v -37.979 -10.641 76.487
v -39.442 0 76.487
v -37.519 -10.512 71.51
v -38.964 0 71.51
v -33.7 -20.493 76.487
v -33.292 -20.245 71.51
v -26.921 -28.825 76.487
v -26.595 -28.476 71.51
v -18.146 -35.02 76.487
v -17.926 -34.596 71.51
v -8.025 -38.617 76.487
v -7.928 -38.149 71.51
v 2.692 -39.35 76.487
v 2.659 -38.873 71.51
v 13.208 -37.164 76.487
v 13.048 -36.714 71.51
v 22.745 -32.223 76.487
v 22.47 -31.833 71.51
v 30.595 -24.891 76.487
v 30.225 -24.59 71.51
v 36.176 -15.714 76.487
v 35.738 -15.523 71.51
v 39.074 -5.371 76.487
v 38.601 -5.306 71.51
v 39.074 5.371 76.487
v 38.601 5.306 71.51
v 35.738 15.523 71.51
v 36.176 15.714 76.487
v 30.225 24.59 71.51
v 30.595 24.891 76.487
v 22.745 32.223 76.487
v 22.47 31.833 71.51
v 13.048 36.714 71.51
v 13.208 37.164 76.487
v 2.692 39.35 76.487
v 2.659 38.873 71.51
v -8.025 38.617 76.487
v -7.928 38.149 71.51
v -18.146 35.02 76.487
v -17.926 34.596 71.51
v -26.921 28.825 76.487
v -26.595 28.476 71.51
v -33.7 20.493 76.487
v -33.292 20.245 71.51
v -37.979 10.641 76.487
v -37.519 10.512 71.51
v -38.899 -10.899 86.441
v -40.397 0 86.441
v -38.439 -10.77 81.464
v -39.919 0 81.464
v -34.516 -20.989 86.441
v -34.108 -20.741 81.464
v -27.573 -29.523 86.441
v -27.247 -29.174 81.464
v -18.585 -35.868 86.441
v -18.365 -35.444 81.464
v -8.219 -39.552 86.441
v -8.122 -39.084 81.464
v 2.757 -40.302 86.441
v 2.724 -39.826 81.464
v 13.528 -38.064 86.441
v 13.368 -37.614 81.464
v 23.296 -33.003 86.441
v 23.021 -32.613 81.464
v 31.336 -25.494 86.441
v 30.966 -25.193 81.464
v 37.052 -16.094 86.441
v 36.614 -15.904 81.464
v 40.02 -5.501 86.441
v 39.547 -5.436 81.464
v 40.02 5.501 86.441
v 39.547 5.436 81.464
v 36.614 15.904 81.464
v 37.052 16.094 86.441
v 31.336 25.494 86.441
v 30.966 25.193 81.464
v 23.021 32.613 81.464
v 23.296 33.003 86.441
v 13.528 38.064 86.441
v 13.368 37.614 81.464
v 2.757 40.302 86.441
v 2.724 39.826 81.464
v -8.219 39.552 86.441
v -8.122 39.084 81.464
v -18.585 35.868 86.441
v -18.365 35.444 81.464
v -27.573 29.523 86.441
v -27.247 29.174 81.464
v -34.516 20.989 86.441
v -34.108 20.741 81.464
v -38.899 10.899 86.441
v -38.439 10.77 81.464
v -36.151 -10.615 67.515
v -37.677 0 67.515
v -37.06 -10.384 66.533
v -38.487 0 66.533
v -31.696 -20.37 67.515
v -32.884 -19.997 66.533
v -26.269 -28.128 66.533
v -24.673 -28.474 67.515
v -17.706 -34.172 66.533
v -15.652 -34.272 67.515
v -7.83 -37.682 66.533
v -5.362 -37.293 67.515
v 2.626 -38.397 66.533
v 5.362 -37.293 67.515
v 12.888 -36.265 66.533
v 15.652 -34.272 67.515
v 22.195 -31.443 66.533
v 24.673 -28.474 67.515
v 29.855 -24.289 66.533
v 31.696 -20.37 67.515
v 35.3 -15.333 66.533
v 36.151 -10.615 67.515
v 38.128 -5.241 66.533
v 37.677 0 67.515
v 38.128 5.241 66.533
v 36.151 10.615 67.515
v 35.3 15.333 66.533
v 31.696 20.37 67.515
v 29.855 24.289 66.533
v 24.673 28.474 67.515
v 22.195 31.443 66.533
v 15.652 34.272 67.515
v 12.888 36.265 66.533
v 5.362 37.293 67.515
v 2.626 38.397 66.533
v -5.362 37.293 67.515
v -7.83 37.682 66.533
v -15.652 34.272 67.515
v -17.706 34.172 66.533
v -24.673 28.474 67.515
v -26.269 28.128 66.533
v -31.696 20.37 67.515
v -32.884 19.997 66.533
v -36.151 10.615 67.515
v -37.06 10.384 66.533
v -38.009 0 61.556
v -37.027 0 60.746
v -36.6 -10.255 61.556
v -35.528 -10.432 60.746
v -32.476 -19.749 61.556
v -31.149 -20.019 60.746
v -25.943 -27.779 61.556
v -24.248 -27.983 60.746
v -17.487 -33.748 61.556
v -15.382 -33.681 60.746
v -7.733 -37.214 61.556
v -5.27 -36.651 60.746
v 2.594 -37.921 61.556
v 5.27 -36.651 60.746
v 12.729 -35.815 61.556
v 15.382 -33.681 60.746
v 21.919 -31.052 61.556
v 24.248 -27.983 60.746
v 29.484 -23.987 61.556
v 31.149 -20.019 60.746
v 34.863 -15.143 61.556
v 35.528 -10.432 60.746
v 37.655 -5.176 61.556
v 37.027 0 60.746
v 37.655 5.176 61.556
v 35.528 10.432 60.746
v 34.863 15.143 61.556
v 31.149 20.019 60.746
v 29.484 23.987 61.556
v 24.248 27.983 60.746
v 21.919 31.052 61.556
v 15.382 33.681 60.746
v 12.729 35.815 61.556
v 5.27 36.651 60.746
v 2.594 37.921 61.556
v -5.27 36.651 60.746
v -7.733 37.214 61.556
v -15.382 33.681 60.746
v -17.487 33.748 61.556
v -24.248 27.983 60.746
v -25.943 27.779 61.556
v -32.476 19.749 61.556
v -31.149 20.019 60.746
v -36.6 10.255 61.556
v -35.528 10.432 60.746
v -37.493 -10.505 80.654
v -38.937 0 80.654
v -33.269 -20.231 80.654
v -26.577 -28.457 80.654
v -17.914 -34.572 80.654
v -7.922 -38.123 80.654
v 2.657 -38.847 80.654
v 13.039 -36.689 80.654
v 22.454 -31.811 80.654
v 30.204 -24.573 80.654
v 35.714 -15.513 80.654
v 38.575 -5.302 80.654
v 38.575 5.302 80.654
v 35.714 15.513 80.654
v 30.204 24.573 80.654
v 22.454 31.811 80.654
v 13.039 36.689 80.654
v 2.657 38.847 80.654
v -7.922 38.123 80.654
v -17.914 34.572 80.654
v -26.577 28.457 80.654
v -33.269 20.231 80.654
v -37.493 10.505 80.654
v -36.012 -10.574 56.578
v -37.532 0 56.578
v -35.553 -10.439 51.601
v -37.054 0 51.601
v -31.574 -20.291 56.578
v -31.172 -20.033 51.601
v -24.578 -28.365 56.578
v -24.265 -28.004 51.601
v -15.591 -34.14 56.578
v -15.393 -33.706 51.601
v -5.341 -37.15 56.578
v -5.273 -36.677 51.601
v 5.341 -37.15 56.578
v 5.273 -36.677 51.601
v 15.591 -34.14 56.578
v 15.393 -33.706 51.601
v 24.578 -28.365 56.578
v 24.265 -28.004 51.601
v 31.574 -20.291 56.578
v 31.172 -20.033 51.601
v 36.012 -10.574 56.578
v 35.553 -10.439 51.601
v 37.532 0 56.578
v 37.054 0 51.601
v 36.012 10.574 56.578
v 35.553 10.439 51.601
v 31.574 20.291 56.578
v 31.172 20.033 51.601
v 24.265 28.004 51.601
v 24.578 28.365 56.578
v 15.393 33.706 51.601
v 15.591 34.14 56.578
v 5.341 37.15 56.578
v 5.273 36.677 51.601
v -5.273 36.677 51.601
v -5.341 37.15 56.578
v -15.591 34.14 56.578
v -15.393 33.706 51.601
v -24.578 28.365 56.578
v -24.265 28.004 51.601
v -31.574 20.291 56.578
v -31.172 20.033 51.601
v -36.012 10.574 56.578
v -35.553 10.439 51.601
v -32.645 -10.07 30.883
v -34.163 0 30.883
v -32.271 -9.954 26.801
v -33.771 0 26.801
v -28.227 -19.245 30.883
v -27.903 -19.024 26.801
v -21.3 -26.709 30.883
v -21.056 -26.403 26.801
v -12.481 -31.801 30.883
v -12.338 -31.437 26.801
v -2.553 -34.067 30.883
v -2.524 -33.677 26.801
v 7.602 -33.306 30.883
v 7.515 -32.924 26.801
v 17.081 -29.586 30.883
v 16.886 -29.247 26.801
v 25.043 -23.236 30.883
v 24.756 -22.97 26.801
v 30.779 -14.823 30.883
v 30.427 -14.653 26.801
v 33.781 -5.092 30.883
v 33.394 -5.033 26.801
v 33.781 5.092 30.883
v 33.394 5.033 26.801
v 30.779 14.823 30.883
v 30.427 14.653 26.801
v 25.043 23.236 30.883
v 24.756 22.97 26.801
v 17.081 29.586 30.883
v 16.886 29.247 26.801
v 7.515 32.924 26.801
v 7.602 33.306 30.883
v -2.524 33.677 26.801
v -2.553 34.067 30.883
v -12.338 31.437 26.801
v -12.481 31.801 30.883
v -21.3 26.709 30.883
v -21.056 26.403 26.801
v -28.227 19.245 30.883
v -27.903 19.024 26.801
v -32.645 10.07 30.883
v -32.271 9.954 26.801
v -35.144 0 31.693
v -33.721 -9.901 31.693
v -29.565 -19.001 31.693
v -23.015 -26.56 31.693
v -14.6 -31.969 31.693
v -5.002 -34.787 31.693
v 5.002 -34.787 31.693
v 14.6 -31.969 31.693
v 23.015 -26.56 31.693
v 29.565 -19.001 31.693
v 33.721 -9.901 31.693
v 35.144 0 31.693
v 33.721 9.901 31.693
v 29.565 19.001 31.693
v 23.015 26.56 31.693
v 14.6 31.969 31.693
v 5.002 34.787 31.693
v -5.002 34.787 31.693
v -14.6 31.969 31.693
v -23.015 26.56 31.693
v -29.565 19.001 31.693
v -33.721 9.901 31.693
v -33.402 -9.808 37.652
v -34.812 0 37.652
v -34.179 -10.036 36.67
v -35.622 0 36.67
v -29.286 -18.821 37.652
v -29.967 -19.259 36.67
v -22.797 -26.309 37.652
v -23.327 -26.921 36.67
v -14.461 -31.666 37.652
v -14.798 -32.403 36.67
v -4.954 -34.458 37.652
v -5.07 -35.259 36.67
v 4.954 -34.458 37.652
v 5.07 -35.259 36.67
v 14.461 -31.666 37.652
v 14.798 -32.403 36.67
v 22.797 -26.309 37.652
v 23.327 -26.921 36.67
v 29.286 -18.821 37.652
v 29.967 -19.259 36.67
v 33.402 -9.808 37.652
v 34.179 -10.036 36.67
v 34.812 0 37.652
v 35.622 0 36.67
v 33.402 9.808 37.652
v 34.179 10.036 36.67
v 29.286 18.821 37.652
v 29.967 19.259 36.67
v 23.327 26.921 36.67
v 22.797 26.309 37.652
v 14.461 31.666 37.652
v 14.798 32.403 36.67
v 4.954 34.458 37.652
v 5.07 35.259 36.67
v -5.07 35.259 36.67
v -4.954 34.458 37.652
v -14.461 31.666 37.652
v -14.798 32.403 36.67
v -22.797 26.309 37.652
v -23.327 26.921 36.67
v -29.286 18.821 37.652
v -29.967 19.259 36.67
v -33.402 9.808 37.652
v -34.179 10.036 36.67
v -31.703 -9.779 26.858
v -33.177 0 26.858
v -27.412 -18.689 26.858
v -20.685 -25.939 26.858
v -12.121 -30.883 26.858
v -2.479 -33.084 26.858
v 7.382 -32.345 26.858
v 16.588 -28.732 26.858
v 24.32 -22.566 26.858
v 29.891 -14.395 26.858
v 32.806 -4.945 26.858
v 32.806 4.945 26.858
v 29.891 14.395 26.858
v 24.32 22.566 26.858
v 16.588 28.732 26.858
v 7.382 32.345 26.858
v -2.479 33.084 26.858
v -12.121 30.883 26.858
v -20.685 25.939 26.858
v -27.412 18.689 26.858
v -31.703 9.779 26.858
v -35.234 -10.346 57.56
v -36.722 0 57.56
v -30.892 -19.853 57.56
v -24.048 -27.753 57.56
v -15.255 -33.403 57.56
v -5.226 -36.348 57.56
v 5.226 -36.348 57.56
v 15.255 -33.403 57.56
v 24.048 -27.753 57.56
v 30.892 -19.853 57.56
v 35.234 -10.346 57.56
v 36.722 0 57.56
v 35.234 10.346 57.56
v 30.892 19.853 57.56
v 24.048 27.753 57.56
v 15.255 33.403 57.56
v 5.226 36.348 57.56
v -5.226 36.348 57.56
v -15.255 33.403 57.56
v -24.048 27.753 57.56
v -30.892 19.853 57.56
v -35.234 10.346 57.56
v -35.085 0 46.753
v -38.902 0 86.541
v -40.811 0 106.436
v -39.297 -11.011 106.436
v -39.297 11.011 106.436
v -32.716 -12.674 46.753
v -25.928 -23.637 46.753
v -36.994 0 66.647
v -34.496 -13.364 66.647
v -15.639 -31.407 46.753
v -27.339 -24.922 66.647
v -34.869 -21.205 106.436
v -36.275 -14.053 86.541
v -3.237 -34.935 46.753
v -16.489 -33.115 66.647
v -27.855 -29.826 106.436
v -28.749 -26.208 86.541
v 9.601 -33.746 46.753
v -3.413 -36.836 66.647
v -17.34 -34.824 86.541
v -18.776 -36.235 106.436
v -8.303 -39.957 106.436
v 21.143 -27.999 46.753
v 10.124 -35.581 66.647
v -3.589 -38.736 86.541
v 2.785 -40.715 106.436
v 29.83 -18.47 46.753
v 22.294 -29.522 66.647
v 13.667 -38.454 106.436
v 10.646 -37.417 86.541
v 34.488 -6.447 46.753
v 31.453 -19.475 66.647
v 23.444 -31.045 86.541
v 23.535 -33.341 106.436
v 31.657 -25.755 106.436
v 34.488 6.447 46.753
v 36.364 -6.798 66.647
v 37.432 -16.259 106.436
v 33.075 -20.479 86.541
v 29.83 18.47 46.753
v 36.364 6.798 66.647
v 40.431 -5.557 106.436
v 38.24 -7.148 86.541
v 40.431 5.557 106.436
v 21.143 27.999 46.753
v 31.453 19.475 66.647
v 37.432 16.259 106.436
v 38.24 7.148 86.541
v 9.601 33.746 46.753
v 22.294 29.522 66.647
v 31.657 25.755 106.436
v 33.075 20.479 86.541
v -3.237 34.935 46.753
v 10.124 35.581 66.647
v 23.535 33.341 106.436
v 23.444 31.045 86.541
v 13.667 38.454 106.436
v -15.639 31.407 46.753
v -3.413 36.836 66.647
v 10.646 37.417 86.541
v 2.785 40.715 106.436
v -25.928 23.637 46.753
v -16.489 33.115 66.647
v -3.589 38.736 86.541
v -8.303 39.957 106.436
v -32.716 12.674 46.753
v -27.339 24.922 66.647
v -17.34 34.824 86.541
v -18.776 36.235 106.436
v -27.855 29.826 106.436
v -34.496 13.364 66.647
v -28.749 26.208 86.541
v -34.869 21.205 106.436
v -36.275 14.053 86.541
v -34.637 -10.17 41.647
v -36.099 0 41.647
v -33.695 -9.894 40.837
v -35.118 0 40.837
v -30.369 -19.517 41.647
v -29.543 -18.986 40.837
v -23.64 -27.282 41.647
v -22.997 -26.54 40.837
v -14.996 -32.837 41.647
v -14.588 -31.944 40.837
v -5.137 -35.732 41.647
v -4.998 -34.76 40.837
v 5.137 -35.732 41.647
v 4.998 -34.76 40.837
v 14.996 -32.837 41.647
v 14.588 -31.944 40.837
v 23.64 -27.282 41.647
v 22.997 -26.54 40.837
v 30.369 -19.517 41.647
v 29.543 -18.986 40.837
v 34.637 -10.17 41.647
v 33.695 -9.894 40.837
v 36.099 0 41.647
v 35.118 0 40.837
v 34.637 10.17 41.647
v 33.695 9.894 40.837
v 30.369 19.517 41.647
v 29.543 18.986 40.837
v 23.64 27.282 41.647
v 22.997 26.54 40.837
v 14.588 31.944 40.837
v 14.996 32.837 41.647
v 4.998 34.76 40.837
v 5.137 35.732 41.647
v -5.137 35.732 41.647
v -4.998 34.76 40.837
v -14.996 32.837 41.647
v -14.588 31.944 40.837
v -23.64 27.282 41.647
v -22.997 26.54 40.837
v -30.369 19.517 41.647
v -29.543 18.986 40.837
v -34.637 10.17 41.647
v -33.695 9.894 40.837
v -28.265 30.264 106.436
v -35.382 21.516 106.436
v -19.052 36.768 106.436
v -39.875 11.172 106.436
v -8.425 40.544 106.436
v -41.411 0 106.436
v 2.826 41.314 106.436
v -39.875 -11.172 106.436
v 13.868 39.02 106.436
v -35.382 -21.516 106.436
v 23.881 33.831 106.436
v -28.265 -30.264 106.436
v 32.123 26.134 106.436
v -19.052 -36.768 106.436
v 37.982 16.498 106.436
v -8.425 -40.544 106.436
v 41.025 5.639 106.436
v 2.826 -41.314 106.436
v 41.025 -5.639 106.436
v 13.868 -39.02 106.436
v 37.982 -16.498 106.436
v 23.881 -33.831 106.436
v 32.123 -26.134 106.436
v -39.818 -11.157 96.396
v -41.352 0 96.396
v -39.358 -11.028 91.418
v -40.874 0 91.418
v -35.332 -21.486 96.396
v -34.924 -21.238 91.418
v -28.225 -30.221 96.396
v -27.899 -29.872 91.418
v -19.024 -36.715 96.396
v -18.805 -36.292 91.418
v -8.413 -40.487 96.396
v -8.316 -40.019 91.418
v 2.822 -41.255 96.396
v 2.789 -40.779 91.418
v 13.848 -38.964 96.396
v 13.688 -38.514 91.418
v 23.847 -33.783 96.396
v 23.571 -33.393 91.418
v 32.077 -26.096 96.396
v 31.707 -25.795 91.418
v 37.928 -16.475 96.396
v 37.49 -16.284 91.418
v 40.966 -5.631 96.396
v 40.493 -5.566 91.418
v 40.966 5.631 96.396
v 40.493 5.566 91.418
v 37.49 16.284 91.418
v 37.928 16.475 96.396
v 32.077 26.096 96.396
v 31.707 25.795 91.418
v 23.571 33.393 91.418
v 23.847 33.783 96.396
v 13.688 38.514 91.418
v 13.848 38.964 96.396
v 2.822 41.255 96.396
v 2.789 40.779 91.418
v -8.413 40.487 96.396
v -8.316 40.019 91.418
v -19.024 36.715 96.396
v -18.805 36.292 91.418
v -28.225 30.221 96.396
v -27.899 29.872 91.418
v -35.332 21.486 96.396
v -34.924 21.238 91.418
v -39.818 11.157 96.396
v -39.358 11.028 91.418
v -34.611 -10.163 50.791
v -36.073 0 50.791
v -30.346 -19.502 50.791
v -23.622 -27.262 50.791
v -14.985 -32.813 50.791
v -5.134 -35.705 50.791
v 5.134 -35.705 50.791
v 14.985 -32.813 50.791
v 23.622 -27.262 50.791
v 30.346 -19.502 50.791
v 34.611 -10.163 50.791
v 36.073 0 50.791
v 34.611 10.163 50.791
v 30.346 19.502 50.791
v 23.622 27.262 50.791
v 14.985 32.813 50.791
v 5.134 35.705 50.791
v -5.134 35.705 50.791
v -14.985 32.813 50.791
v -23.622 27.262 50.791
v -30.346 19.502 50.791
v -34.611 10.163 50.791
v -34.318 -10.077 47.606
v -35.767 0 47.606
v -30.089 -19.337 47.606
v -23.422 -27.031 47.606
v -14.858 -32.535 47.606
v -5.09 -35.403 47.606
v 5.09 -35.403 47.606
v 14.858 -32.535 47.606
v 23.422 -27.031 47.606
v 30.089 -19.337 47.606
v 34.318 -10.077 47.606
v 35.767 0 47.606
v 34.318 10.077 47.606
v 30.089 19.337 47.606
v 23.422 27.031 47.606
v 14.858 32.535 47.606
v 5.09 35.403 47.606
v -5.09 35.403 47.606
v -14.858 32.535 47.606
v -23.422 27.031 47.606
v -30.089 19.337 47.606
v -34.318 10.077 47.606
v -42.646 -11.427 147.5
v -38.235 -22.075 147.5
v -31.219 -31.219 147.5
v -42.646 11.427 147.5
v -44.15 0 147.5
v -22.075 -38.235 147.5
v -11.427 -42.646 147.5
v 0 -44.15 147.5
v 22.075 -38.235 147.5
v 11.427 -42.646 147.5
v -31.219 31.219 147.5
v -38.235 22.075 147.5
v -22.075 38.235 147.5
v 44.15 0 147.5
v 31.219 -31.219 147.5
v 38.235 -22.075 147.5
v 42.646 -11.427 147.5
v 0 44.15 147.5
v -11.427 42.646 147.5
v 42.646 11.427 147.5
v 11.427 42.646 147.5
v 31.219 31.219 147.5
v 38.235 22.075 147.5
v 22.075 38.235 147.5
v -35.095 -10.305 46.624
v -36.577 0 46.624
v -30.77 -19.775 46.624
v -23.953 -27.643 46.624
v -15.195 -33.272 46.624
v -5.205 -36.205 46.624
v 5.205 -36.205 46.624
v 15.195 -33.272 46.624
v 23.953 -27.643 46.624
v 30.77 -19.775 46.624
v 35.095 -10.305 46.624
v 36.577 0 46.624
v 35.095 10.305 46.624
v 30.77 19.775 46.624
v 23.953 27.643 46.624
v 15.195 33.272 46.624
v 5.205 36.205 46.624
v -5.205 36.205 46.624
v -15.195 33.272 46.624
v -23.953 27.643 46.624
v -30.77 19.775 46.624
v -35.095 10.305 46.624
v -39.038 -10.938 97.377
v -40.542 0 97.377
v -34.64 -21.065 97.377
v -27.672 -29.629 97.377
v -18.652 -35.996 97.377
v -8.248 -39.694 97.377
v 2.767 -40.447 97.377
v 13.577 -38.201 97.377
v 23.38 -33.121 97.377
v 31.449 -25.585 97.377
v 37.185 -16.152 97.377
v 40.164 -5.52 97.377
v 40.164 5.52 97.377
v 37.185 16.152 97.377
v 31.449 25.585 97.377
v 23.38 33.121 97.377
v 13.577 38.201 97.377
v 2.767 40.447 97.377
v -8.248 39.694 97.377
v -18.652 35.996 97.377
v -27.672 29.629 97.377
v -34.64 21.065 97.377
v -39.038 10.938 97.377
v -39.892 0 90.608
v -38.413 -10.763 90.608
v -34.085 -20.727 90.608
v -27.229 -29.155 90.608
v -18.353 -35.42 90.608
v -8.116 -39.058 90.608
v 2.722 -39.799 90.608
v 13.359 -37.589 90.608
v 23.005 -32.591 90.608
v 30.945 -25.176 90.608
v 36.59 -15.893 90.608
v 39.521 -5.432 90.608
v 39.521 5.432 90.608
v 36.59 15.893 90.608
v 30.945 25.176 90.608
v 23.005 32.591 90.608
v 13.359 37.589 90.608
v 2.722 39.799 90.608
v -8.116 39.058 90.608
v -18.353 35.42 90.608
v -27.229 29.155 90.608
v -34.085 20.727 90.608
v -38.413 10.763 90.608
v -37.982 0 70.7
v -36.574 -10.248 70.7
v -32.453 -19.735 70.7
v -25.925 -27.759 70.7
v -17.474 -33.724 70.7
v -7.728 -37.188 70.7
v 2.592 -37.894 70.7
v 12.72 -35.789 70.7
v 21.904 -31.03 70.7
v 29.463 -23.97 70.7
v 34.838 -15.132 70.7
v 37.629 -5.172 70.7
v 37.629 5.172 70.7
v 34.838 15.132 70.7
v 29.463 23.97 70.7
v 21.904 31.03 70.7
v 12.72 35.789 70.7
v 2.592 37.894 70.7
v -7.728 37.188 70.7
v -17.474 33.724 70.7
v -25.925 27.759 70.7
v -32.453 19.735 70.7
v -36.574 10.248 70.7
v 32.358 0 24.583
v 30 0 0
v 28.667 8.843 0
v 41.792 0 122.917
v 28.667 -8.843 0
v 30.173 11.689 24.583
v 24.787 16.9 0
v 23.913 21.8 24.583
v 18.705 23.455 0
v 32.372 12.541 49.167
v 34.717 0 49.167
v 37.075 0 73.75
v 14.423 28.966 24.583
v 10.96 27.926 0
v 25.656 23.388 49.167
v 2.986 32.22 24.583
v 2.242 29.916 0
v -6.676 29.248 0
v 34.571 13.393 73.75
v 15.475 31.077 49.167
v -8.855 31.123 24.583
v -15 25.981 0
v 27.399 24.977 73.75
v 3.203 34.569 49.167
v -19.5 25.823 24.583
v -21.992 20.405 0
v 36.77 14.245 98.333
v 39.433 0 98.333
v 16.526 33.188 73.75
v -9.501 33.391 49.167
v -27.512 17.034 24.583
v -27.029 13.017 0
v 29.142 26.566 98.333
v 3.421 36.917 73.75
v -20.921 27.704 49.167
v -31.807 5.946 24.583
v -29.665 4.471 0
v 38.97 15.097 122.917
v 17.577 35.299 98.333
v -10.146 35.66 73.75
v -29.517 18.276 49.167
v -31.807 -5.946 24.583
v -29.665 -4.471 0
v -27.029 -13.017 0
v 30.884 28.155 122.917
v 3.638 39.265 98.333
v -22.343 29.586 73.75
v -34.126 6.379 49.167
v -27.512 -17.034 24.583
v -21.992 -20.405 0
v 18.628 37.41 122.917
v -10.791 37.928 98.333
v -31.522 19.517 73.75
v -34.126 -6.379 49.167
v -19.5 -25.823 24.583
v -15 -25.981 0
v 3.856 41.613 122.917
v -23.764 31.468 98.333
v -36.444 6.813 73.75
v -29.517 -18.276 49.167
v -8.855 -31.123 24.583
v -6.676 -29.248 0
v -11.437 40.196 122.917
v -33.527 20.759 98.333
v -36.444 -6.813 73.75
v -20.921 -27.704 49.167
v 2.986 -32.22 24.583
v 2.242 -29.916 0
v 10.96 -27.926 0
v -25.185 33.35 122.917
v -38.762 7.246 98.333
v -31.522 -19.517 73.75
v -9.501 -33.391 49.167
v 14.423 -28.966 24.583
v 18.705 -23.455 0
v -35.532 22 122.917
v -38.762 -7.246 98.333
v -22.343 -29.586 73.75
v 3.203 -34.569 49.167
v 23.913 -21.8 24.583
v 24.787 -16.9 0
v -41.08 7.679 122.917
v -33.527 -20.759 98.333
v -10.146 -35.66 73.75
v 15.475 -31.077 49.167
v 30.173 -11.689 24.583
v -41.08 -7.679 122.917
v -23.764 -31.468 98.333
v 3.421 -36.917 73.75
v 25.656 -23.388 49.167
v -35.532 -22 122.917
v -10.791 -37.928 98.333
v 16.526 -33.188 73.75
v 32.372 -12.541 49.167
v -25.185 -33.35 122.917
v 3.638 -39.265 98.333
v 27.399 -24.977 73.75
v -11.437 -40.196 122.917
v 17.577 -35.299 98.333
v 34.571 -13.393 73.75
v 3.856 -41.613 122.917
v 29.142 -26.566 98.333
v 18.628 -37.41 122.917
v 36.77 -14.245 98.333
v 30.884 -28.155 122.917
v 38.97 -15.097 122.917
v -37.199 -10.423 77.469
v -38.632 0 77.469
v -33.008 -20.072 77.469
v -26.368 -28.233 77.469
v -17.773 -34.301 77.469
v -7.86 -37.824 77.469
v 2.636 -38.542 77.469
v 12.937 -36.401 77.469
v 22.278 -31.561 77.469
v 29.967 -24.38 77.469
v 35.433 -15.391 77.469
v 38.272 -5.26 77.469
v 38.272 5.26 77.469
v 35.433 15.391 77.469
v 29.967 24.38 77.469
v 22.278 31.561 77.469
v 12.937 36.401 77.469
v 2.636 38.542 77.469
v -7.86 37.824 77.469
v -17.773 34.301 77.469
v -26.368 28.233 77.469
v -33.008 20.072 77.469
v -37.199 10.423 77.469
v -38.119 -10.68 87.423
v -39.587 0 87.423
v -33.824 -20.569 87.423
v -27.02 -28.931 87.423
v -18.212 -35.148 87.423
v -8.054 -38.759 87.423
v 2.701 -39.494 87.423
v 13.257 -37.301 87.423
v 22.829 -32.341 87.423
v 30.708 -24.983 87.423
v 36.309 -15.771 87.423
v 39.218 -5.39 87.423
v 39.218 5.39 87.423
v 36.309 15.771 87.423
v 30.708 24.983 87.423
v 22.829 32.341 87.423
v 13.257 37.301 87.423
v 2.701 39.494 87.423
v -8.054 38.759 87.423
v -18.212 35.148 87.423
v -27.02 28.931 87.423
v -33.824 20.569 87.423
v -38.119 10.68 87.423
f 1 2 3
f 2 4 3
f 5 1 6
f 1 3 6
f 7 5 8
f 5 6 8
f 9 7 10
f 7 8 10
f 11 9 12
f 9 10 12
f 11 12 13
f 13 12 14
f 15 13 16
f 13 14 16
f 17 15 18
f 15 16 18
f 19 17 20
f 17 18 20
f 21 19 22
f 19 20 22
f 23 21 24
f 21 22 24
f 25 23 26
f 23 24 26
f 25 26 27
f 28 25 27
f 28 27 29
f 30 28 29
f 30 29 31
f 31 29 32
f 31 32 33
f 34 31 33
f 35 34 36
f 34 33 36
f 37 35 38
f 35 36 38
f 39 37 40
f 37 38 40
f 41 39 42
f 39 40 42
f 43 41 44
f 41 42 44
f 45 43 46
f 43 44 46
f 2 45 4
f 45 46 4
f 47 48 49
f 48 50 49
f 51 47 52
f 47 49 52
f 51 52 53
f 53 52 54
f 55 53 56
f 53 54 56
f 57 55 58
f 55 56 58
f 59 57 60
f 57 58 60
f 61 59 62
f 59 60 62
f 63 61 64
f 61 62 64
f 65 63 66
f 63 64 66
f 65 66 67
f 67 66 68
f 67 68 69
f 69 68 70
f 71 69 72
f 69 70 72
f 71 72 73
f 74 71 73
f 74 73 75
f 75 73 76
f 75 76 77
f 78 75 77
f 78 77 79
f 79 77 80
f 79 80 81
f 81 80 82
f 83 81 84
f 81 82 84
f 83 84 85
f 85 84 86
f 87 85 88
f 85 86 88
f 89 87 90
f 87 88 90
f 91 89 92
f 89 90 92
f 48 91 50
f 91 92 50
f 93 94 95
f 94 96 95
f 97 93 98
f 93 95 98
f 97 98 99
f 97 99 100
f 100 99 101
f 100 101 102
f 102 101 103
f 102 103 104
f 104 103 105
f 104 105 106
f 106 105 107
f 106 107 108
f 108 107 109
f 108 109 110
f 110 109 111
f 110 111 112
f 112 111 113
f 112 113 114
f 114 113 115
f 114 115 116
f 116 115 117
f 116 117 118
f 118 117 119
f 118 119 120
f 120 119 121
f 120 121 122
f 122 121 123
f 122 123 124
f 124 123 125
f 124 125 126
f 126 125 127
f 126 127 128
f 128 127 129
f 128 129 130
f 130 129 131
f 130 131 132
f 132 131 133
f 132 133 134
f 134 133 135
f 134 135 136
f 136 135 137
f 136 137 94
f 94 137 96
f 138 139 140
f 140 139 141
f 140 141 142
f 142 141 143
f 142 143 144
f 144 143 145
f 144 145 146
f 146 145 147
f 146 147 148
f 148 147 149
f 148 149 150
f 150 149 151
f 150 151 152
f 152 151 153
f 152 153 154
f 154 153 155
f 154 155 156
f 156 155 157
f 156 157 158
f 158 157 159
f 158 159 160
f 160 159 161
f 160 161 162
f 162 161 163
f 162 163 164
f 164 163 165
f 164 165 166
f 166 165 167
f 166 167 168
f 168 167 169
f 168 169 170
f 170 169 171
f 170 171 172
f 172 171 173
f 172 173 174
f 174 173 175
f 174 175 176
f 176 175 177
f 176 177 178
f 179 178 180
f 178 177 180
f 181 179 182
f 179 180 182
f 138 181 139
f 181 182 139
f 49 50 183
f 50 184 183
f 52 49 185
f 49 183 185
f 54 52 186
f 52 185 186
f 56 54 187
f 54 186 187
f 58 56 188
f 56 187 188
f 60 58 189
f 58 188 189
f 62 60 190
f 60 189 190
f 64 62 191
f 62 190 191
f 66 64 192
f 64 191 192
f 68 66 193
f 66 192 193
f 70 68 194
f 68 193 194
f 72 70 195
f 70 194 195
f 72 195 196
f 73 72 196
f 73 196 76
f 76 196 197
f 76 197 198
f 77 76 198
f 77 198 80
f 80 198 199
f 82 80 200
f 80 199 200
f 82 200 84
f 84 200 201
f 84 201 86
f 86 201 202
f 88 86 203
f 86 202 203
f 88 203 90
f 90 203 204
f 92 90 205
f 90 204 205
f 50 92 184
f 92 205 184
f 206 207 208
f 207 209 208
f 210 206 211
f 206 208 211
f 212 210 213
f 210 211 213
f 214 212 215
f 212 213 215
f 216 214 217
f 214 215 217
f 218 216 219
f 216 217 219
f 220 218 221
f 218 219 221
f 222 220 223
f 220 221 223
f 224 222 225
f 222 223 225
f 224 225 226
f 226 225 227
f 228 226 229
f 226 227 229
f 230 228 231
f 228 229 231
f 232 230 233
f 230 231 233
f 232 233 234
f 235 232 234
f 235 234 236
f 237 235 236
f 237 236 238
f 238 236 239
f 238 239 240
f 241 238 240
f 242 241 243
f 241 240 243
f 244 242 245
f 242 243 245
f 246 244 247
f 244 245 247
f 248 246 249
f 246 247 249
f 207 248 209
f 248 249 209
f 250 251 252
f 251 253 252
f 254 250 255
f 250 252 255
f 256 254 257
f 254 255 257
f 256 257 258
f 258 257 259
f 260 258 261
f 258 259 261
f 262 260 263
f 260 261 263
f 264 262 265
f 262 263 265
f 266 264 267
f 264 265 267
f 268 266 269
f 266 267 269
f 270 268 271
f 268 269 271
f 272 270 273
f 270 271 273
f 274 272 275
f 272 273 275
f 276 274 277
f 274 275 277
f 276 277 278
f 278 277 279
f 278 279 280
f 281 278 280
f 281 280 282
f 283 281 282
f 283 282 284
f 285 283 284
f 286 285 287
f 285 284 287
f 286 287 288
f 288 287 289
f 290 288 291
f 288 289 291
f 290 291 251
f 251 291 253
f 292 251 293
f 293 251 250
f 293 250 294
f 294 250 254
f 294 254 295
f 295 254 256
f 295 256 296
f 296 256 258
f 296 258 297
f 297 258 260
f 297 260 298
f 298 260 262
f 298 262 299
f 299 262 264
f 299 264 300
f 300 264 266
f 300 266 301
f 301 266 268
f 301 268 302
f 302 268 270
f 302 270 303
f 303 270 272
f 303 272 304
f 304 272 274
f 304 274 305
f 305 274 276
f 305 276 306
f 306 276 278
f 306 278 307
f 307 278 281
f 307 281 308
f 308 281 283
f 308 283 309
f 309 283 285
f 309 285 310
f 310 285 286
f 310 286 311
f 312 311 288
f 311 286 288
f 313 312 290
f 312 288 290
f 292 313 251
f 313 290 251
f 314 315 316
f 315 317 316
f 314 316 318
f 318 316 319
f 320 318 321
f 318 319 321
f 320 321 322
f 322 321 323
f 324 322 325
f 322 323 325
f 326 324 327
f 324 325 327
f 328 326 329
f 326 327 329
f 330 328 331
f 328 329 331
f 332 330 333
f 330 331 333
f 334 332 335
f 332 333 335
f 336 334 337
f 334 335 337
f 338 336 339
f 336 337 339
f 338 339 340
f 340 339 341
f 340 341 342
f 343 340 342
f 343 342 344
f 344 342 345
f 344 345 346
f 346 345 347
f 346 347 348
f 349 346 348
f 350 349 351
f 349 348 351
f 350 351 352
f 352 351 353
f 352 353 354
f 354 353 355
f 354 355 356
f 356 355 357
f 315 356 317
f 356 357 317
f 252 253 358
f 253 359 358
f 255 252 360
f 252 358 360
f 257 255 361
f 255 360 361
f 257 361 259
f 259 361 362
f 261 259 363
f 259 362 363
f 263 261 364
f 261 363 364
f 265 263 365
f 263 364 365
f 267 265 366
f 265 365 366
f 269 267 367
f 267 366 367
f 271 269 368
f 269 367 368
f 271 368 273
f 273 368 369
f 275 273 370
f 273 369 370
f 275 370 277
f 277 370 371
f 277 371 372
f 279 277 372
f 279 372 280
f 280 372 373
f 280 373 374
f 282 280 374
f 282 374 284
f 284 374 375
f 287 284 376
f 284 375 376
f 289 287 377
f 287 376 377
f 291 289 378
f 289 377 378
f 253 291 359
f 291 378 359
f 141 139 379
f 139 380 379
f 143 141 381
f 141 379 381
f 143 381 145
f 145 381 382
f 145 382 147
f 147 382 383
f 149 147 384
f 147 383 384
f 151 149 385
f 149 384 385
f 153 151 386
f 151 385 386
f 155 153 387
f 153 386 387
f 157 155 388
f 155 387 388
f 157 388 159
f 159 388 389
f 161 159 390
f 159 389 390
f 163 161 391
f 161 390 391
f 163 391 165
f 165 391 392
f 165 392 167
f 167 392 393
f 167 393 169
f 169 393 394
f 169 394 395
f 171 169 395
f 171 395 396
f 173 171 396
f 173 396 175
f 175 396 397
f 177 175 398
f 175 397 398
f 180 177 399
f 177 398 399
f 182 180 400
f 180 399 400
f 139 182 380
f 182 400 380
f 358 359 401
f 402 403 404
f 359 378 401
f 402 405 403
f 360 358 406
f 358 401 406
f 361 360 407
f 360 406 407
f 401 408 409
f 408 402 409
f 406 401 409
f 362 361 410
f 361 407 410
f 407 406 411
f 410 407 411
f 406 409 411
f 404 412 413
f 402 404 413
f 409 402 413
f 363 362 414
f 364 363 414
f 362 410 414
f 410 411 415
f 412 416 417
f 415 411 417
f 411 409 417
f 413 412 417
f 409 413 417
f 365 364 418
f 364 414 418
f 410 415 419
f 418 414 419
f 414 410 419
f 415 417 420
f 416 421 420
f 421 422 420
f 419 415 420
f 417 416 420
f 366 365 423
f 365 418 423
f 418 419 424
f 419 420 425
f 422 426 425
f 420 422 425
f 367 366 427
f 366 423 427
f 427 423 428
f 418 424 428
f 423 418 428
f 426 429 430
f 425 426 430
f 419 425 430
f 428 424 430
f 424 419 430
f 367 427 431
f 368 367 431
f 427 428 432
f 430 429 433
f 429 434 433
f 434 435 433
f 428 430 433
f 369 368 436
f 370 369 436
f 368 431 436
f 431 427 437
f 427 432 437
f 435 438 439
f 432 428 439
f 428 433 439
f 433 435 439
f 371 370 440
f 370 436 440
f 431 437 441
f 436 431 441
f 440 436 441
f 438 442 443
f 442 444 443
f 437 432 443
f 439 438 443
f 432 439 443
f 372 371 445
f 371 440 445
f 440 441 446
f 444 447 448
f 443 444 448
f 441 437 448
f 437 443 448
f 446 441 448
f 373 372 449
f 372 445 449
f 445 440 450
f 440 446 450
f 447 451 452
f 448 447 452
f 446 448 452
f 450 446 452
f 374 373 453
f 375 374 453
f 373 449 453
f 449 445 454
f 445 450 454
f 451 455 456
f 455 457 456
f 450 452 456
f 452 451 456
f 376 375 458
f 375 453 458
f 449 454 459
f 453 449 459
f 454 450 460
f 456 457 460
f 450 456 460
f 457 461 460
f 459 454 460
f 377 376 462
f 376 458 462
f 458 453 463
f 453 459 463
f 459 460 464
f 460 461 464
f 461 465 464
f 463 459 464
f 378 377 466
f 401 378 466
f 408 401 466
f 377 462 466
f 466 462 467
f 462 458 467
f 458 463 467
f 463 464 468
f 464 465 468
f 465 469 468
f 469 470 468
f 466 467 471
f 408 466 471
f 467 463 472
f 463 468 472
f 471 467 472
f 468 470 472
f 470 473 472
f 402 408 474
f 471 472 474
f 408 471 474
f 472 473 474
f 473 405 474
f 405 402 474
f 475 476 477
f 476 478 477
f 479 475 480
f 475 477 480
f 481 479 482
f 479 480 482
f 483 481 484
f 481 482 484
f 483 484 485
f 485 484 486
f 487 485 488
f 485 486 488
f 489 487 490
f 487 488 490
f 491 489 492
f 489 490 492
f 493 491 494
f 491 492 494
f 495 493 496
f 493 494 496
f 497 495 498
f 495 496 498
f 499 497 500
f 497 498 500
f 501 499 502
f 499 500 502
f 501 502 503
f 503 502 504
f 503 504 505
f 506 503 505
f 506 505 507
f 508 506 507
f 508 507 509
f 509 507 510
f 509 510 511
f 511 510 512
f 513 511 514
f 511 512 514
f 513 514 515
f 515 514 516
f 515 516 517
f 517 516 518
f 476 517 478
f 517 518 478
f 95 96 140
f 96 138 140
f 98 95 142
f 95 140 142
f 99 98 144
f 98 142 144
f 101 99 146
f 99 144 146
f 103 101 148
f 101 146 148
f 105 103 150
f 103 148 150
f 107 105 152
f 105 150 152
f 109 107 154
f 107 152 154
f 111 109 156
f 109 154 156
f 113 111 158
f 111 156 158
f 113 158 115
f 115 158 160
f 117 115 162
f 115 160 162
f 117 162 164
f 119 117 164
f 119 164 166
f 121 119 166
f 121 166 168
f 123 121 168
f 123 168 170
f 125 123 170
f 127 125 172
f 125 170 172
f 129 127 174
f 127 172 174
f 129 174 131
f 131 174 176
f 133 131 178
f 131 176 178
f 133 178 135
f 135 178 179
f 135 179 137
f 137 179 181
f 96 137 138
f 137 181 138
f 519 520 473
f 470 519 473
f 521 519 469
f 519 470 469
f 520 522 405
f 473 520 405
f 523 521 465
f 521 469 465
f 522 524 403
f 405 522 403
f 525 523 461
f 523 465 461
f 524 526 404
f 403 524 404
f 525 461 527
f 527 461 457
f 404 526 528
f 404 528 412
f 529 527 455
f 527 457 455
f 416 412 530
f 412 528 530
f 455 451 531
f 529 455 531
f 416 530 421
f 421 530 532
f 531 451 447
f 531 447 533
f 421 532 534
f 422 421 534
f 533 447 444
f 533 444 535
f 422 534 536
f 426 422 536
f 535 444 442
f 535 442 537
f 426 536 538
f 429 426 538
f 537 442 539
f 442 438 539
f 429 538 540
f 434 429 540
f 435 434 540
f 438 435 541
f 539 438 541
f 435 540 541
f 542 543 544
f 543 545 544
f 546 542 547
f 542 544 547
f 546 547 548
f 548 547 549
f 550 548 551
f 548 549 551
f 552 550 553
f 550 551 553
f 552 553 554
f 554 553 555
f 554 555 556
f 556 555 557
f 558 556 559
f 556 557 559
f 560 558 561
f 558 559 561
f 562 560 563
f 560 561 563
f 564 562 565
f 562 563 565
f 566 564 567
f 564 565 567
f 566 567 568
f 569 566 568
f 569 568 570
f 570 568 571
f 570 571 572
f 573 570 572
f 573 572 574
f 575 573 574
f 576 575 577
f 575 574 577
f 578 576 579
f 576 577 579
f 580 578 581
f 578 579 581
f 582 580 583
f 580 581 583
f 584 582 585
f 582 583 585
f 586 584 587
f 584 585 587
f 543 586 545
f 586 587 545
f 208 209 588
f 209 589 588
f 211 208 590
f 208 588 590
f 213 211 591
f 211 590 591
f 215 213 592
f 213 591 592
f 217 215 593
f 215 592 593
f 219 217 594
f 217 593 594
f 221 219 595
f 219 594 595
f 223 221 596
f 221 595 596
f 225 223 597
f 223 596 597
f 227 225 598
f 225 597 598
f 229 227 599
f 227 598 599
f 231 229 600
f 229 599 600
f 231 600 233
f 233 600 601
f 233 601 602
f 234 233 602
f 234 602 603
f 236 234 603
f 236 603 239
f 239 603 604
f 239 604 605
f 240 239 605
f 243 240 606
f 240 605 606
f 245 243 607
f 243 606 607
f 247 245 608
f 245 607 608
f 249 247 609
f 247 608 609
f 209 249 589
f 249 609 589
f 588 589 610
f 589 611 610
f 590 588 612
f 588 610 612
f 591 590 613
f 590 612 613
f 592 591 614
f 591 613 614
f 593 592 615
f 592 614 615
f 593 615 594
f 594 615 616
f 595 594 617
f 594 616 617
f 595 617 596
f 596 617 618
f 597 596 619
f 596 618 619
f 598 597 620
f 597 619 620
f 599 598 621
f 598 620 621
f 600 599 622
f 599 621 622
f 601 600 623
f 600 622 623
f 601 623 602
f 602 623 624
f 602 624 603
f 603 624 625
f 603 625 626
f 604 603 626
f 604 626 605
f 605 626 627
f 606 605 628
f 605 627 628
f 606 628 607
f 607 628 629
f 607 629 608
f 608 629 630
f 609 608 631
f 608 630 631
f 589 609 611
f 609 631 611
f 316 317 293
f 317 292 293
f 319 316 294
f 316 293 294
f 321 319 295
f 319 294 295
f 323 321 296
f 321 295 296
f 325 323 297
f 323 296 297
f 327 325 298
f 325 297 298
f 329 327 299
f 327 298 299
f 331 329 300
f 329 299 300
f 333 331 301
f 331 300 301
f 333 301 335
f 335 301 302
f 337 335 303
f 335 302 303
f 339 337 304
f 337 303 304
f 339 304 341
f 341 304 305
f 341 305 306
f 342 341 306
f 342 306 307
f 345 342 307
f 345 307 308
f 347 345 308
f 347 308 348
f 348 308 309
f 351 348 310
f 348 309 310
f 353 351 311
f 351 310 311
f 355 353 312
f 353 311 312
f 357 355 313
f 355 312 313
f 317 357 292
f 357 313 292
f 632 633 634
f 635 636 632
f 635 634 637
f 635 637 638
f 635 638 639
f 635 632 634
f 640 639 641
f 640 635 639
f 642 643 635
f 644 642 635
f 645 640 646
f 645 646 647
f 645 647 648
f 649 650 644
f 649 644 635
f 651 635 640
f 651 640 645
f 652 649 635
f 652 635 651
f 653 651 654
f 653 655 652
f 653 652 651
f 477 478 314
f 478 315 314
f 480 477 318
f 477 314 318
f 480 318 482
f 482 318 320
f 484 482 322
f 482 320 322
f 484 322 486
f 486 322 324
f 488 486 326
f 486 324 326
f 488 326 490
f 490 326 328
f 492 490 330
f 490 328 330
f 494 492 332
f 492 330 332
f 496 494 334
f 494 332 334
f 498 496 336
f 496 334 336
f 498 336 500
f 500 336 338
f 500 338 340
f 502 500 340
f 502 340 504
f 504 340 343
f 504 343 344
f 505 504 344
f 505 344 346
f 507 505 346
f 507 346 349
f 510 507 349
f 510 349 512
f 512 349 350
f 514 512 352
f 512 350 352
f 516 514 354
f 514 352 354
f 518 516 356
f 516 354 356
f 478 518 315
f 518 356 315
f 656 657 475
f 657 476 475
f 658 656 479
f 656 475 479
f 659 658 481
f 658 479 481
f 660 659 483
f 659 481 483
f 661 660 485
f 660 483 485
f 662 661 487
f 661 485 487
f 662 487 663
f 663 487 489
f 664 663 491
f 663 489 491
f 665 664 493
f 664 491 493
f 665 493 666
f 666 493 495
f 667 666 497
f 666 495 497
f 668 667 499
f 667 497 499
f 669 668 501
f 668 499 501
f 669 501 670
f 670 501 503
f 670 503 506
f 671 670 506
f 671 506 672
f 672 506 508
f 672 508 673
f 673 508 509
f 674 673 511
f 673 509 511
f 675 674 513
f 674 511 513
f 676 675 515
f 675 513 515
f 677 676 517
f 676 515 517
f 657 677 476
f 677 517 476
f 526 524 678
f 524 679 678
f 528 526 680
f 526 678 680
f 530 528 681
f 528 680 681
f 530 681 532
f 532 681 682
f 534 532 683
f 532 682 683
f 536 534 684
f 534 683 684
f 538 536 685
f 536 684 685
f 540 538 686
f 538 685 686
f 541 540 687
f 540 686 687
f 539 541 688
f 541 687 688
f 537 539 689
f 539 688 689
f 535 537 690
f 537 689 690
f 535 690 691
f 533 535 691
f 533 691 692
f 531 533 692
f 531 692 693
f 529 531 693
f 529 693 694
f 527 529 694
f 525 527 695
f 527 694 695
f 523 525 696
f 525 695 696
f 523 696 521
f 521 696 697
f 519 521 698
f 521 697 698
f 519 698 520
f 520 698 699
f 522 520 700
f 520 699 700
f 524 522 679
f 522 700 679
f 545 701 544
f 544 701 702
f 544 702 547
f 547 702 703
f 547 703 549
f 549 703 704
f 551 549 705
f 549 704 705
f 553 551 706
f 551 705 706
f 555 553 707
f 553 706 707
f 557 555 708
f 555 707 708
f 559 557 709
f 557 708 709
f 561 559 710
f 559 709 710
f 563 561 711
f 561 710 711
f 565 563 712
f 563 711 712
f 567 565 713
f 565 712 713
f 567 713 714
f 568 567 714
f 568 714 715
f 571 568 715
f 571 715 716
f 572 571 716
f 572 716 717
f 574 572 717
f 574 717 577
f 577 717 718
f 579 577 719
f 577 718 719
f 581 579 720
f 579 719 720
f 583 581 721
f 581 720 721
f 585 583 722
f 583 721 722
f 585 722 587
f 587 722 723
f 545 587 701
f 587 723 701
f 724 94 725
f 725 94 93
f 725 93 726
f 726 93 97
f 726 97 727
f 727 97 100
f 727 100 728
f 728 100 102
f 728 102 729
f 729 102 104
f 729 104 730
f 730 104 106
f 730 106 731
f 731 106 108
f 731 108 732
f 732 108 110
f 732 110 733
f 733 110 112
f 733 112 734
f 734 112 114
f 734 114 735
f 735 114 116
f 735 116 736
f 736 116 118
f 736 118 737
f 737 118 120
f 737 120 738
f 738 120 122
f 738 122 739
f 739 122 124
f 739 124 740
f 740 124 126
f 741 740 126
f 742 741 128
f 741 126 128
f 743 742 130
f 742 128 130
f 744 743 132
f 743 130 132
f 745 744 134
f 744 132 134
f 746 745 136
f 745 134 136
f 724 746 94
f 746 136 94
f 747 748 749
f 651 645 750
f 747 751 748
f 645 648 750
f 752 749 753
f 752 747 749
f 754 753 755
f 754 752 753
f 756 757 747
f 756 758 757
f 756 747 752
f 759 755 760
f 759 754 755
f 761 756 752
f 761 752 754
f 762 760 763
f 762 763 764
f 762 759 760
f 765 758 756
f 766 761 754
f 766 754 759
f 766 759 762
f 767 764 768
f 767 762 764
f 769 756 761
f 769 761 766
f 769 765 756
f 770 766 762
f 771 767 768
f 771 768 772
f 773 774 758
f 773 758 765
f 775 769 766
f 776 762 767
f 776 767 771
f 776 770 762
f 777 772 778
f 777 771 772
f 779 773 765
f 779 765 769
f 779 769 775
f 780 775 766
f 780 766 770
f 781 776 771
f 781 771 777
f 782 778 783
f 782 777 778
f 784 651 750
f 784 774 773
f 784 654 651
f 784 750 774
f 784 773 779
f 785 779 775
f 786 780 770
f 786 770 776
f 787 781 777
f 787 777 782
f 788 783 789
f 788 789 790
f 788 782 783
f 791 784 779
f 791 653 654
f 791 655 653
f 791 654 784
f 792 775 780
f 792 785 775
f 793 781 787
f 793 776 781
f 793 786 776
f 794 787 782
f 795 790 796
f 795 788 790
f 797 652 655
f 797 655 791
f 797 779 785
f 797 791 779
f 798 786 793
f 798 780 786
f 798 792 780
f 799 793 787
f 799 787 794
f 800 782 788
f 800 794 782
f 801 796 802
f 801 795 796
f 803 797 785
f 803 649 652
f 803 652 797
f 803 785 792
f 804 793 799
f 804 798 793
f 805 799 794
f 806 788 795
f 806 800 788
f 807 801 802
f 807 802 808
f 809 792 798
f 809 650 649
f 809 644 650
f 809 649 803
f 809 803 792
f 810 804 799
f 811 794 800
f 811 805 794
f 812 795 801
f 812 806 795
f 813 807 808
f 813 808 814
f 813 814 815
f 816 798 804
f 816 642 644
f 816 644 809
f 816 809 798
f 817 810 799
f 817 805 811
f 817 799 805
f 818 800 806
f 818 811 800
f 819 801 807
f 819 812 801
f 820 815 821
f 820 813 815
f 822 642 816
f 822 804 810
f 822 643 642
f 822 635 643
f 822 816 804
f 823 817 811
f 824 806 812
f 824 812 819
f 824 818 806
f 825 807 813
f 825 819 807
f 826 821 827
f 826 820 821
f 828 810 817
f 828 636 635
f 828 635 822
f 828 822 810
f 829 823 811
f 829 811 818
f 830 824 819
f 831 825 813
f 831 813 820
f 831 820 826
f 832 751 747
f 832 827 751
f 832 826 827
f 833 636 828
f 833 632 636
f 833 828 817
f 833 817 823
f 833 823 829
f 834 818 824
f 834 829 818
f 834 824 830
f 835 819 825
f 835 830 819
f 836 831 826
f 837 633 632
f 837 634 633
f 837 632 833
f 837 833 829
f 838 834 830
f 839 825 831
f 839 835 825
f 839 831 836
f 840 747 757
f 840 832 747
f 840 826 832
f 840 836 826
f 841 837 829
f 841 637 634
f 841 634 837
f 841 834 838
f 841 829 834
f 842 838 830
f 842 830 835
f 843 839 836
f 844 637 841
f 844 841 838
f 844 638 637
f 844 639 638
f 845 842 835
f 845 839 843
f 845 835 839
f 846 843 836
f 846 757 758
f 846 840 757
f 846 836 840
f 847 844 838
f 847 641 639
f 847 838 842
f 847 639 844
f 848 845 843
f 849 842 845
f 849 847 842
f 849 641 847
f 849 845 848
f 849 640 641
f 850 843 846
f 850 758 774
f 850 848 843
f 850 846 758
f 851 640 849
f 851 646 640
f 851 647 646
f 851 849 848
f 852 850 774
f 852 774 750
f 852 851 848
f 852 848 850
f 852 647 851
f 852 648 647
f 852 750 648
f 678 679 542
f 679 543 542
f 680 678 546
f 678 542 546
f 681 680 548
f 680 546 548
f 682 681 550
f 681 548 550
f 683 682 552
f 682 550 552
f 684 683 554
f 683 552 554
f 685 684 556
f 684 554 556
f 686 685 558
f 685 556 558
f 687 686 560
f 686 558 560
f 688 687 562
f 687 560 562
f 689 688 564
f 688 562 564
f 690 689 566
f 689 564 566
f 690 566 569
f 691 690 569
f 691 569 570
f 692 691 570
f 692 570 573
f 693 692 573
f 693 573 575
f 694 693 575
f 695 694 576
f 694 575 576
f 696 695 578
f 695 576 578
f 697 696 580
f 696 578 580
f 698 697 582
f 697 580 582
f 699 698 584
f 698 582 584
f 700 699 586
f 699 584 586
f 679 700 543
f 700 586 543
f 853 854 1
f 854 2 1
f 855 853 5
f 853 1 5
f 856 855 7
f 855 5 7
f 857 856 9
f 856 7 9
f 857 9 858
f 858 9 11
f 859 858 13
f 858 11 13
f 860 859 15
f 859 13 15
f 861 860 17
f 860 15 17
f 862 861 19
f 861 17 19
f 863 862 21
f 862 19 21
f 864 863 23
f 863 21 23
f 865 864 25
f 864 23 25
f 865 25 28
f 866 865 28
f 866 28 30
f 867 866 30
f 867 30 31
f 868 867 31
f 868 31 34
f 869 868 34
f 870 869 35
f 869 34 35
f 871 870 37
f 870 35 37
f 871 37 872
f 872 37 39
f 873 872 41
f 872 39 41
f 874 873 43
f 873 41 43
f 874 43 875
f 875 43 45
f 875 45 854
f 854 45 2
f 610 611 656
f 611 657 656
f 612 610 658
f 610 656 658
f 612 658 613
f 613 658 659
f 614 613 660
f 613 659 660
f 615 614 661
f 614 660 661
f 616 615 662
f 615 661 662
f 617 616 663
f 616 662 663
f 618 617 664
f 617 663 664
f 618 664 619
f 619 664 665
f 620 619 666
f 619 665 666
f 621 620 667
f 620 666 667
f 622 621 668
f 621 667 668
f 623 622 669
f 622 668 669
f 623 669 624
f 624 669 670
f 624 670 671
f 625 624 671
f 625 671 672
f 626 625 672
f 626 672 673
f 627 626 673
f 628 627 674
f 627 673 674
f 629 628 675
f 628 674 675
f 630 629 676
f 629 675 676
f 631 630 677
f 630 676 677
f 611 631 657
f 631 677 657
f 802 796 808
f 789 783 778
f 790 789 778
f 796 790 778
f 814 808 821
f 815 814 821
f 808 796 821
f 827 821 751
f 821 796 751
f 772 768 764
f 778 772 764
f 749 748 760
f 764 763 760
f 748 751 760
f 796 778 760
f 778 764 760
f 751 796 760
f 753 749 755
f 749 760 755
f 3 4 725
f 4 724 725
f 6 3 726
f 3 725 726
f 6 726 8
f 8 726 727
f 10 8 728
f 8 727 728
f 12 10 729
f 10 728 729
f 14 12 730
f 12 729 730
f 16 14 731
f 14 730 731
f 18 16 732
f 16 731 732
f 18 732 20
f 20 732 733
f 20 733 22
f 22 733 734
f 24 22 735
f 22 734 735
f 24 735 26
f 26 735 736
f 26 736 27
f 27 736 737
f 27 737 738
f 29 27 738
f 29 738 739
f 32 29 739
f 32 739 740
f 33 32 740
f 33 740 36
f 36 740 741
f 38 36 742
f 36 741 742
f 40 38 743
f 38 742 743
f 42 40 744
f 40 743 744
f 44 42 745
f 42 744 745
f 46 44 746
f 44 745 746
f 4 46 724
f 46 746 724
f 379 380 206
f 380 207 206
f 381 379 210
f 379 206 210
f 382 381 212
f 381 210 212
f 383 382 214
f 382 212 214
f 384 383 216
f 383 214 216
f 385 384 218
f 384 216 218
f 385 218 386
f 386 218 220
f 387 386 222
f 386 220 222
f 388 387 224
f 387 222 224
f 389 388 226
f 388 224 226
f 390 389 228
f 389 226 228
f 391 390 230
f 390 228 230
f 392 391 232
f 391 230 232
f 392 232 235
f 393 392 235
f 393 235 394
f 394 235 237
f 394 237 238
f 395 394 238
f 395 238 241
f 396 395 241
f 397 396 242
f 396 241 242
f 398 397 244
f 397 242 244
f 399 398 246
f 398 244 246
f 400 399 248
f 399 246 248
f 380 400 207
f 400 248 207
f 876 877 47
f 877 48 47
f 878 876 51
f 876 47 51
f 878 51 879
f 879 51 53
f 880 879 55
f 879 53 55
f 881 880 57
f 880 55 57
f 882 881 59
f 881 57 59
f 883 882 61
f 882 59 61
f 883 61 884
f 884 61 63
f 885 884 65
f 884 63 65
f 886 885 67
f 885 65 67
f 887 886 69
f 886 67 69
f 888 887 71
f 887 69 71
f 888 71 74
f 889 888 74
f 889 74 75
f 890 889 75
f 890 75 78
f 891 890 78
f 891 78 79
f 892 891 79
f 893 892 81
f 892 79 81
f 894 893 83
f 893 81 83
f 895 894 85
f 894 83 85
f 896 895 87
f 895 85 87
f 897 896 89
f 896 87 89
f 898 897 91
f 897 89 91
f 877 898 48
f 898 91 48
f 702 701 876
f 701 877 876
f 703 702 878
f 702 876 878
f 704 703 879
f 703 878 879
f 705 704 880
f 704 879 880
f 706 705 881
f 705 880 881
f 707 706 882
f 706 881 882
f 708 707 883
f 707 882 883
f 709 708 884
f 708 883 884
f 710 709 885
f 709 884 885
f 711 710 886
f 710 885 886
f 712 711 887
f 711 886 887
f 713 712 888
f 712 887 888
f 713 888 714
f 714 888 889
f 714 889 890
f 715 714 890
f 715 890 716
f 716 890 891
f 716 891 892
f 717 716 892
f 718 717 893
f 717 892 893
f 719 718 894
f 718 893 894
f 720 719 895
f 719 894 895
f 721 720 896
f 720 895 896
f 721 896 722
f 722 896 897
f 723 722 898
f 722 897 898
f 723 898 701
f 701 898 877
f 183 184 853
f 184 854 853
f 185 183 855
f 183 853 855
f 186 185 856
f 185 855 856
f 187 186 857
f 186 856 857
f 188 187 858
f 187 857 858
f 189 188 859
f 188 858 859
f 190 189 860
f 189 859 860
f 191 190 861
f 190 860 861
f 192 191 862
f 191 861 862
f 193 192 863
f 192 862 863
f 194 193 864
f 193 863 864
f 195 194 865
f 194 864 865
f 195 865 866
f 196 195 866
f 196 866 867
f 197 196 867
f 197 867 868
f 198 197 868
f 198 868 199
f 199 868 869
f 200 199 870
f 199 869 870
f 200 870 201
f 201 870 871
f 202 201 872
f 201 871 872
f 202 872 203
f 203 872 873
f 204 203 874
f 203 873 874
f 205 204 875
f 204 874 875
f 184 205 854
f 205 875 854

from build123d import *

# Parameters (mm, degrees)
F0_R = 30
F2_R = 44.15


with BuildPart() as f3:
    # F0 (on Top) → F3 section 0
    with BuildSketch(Plane.XY):
        Circle(F0_R)
    # F2 (on offset) → F3 section 1
    with BuildSketch(Plane.XY.offset(147.5)):
        Circle(F2_R)
    loft()


with BuildPart() as f5:
    # F4 (on Front) → F5 (revolve)
    with BuildSketch(Plane.XZ):
        Polygon((-39.892271, 90.608482), (-40.541629, 97.377406), (-41.351572, 96.395574), (-40.874103, 91.418424), align=None)
        Polygon((-33.17659, 26.858451), (-40.810623, 106.435819), (-41.410623, 106.435819), (-40.541629, 97.377406), (-39.892271, 90.608482), (-39.586691, 87.423106), (-38.937333, 80.654181), (-38.631753, 77.468805), (-37.982395, 70.699881), (-37.676815, 67.514505), (-37.027457, 60.745581), (-36.721877, 57.560205), (-36.072519, 50.791281), (-35.766939, 47.605905), (-35.117582, 40.83698), (-34.812001, 37.651604), (-34.162644, 30.88268), (-33.771119, 26.801417), align=None)
        Polygon((-38.937333, 80.654181), (-39.586691, 87.423106), (-40.396634, 86.441274), (-39.919165, 81.464124), align=None)
        Polygon((-37.027457, 60.745581), (-37.676815, 67.514505), (-38.486758, 66.532674), (-38.009289, 61.555523), align=None)
        Polygon((-37.982395, 70.699881), (-38.631753, 77.468805), (-39.441696, 76.486974), (-38.964227, 71.509824), align=None)
        Polygon((-37.054351, 51.601223), (-36.072519, 50.791281), (-36.721877, 57.560205), (-37.53182, 56.578373), align=None)
        Polygon((-36.099413, 41.646923), (-35.117582, 40.83698), (-35.766939, 47.605905), (-36.576882, 46.624073), align=None)
        Polygon((-35.144475, 31.692623), (-34.162644, 30.88268), (-34.812001, 37.651604), (-35.621944, 36.669773), align=None)
    revolve(axis=Axis((0, 0, 73.75), (0, 0, 1)))


solid = Compound([f3.part, f5.part])
